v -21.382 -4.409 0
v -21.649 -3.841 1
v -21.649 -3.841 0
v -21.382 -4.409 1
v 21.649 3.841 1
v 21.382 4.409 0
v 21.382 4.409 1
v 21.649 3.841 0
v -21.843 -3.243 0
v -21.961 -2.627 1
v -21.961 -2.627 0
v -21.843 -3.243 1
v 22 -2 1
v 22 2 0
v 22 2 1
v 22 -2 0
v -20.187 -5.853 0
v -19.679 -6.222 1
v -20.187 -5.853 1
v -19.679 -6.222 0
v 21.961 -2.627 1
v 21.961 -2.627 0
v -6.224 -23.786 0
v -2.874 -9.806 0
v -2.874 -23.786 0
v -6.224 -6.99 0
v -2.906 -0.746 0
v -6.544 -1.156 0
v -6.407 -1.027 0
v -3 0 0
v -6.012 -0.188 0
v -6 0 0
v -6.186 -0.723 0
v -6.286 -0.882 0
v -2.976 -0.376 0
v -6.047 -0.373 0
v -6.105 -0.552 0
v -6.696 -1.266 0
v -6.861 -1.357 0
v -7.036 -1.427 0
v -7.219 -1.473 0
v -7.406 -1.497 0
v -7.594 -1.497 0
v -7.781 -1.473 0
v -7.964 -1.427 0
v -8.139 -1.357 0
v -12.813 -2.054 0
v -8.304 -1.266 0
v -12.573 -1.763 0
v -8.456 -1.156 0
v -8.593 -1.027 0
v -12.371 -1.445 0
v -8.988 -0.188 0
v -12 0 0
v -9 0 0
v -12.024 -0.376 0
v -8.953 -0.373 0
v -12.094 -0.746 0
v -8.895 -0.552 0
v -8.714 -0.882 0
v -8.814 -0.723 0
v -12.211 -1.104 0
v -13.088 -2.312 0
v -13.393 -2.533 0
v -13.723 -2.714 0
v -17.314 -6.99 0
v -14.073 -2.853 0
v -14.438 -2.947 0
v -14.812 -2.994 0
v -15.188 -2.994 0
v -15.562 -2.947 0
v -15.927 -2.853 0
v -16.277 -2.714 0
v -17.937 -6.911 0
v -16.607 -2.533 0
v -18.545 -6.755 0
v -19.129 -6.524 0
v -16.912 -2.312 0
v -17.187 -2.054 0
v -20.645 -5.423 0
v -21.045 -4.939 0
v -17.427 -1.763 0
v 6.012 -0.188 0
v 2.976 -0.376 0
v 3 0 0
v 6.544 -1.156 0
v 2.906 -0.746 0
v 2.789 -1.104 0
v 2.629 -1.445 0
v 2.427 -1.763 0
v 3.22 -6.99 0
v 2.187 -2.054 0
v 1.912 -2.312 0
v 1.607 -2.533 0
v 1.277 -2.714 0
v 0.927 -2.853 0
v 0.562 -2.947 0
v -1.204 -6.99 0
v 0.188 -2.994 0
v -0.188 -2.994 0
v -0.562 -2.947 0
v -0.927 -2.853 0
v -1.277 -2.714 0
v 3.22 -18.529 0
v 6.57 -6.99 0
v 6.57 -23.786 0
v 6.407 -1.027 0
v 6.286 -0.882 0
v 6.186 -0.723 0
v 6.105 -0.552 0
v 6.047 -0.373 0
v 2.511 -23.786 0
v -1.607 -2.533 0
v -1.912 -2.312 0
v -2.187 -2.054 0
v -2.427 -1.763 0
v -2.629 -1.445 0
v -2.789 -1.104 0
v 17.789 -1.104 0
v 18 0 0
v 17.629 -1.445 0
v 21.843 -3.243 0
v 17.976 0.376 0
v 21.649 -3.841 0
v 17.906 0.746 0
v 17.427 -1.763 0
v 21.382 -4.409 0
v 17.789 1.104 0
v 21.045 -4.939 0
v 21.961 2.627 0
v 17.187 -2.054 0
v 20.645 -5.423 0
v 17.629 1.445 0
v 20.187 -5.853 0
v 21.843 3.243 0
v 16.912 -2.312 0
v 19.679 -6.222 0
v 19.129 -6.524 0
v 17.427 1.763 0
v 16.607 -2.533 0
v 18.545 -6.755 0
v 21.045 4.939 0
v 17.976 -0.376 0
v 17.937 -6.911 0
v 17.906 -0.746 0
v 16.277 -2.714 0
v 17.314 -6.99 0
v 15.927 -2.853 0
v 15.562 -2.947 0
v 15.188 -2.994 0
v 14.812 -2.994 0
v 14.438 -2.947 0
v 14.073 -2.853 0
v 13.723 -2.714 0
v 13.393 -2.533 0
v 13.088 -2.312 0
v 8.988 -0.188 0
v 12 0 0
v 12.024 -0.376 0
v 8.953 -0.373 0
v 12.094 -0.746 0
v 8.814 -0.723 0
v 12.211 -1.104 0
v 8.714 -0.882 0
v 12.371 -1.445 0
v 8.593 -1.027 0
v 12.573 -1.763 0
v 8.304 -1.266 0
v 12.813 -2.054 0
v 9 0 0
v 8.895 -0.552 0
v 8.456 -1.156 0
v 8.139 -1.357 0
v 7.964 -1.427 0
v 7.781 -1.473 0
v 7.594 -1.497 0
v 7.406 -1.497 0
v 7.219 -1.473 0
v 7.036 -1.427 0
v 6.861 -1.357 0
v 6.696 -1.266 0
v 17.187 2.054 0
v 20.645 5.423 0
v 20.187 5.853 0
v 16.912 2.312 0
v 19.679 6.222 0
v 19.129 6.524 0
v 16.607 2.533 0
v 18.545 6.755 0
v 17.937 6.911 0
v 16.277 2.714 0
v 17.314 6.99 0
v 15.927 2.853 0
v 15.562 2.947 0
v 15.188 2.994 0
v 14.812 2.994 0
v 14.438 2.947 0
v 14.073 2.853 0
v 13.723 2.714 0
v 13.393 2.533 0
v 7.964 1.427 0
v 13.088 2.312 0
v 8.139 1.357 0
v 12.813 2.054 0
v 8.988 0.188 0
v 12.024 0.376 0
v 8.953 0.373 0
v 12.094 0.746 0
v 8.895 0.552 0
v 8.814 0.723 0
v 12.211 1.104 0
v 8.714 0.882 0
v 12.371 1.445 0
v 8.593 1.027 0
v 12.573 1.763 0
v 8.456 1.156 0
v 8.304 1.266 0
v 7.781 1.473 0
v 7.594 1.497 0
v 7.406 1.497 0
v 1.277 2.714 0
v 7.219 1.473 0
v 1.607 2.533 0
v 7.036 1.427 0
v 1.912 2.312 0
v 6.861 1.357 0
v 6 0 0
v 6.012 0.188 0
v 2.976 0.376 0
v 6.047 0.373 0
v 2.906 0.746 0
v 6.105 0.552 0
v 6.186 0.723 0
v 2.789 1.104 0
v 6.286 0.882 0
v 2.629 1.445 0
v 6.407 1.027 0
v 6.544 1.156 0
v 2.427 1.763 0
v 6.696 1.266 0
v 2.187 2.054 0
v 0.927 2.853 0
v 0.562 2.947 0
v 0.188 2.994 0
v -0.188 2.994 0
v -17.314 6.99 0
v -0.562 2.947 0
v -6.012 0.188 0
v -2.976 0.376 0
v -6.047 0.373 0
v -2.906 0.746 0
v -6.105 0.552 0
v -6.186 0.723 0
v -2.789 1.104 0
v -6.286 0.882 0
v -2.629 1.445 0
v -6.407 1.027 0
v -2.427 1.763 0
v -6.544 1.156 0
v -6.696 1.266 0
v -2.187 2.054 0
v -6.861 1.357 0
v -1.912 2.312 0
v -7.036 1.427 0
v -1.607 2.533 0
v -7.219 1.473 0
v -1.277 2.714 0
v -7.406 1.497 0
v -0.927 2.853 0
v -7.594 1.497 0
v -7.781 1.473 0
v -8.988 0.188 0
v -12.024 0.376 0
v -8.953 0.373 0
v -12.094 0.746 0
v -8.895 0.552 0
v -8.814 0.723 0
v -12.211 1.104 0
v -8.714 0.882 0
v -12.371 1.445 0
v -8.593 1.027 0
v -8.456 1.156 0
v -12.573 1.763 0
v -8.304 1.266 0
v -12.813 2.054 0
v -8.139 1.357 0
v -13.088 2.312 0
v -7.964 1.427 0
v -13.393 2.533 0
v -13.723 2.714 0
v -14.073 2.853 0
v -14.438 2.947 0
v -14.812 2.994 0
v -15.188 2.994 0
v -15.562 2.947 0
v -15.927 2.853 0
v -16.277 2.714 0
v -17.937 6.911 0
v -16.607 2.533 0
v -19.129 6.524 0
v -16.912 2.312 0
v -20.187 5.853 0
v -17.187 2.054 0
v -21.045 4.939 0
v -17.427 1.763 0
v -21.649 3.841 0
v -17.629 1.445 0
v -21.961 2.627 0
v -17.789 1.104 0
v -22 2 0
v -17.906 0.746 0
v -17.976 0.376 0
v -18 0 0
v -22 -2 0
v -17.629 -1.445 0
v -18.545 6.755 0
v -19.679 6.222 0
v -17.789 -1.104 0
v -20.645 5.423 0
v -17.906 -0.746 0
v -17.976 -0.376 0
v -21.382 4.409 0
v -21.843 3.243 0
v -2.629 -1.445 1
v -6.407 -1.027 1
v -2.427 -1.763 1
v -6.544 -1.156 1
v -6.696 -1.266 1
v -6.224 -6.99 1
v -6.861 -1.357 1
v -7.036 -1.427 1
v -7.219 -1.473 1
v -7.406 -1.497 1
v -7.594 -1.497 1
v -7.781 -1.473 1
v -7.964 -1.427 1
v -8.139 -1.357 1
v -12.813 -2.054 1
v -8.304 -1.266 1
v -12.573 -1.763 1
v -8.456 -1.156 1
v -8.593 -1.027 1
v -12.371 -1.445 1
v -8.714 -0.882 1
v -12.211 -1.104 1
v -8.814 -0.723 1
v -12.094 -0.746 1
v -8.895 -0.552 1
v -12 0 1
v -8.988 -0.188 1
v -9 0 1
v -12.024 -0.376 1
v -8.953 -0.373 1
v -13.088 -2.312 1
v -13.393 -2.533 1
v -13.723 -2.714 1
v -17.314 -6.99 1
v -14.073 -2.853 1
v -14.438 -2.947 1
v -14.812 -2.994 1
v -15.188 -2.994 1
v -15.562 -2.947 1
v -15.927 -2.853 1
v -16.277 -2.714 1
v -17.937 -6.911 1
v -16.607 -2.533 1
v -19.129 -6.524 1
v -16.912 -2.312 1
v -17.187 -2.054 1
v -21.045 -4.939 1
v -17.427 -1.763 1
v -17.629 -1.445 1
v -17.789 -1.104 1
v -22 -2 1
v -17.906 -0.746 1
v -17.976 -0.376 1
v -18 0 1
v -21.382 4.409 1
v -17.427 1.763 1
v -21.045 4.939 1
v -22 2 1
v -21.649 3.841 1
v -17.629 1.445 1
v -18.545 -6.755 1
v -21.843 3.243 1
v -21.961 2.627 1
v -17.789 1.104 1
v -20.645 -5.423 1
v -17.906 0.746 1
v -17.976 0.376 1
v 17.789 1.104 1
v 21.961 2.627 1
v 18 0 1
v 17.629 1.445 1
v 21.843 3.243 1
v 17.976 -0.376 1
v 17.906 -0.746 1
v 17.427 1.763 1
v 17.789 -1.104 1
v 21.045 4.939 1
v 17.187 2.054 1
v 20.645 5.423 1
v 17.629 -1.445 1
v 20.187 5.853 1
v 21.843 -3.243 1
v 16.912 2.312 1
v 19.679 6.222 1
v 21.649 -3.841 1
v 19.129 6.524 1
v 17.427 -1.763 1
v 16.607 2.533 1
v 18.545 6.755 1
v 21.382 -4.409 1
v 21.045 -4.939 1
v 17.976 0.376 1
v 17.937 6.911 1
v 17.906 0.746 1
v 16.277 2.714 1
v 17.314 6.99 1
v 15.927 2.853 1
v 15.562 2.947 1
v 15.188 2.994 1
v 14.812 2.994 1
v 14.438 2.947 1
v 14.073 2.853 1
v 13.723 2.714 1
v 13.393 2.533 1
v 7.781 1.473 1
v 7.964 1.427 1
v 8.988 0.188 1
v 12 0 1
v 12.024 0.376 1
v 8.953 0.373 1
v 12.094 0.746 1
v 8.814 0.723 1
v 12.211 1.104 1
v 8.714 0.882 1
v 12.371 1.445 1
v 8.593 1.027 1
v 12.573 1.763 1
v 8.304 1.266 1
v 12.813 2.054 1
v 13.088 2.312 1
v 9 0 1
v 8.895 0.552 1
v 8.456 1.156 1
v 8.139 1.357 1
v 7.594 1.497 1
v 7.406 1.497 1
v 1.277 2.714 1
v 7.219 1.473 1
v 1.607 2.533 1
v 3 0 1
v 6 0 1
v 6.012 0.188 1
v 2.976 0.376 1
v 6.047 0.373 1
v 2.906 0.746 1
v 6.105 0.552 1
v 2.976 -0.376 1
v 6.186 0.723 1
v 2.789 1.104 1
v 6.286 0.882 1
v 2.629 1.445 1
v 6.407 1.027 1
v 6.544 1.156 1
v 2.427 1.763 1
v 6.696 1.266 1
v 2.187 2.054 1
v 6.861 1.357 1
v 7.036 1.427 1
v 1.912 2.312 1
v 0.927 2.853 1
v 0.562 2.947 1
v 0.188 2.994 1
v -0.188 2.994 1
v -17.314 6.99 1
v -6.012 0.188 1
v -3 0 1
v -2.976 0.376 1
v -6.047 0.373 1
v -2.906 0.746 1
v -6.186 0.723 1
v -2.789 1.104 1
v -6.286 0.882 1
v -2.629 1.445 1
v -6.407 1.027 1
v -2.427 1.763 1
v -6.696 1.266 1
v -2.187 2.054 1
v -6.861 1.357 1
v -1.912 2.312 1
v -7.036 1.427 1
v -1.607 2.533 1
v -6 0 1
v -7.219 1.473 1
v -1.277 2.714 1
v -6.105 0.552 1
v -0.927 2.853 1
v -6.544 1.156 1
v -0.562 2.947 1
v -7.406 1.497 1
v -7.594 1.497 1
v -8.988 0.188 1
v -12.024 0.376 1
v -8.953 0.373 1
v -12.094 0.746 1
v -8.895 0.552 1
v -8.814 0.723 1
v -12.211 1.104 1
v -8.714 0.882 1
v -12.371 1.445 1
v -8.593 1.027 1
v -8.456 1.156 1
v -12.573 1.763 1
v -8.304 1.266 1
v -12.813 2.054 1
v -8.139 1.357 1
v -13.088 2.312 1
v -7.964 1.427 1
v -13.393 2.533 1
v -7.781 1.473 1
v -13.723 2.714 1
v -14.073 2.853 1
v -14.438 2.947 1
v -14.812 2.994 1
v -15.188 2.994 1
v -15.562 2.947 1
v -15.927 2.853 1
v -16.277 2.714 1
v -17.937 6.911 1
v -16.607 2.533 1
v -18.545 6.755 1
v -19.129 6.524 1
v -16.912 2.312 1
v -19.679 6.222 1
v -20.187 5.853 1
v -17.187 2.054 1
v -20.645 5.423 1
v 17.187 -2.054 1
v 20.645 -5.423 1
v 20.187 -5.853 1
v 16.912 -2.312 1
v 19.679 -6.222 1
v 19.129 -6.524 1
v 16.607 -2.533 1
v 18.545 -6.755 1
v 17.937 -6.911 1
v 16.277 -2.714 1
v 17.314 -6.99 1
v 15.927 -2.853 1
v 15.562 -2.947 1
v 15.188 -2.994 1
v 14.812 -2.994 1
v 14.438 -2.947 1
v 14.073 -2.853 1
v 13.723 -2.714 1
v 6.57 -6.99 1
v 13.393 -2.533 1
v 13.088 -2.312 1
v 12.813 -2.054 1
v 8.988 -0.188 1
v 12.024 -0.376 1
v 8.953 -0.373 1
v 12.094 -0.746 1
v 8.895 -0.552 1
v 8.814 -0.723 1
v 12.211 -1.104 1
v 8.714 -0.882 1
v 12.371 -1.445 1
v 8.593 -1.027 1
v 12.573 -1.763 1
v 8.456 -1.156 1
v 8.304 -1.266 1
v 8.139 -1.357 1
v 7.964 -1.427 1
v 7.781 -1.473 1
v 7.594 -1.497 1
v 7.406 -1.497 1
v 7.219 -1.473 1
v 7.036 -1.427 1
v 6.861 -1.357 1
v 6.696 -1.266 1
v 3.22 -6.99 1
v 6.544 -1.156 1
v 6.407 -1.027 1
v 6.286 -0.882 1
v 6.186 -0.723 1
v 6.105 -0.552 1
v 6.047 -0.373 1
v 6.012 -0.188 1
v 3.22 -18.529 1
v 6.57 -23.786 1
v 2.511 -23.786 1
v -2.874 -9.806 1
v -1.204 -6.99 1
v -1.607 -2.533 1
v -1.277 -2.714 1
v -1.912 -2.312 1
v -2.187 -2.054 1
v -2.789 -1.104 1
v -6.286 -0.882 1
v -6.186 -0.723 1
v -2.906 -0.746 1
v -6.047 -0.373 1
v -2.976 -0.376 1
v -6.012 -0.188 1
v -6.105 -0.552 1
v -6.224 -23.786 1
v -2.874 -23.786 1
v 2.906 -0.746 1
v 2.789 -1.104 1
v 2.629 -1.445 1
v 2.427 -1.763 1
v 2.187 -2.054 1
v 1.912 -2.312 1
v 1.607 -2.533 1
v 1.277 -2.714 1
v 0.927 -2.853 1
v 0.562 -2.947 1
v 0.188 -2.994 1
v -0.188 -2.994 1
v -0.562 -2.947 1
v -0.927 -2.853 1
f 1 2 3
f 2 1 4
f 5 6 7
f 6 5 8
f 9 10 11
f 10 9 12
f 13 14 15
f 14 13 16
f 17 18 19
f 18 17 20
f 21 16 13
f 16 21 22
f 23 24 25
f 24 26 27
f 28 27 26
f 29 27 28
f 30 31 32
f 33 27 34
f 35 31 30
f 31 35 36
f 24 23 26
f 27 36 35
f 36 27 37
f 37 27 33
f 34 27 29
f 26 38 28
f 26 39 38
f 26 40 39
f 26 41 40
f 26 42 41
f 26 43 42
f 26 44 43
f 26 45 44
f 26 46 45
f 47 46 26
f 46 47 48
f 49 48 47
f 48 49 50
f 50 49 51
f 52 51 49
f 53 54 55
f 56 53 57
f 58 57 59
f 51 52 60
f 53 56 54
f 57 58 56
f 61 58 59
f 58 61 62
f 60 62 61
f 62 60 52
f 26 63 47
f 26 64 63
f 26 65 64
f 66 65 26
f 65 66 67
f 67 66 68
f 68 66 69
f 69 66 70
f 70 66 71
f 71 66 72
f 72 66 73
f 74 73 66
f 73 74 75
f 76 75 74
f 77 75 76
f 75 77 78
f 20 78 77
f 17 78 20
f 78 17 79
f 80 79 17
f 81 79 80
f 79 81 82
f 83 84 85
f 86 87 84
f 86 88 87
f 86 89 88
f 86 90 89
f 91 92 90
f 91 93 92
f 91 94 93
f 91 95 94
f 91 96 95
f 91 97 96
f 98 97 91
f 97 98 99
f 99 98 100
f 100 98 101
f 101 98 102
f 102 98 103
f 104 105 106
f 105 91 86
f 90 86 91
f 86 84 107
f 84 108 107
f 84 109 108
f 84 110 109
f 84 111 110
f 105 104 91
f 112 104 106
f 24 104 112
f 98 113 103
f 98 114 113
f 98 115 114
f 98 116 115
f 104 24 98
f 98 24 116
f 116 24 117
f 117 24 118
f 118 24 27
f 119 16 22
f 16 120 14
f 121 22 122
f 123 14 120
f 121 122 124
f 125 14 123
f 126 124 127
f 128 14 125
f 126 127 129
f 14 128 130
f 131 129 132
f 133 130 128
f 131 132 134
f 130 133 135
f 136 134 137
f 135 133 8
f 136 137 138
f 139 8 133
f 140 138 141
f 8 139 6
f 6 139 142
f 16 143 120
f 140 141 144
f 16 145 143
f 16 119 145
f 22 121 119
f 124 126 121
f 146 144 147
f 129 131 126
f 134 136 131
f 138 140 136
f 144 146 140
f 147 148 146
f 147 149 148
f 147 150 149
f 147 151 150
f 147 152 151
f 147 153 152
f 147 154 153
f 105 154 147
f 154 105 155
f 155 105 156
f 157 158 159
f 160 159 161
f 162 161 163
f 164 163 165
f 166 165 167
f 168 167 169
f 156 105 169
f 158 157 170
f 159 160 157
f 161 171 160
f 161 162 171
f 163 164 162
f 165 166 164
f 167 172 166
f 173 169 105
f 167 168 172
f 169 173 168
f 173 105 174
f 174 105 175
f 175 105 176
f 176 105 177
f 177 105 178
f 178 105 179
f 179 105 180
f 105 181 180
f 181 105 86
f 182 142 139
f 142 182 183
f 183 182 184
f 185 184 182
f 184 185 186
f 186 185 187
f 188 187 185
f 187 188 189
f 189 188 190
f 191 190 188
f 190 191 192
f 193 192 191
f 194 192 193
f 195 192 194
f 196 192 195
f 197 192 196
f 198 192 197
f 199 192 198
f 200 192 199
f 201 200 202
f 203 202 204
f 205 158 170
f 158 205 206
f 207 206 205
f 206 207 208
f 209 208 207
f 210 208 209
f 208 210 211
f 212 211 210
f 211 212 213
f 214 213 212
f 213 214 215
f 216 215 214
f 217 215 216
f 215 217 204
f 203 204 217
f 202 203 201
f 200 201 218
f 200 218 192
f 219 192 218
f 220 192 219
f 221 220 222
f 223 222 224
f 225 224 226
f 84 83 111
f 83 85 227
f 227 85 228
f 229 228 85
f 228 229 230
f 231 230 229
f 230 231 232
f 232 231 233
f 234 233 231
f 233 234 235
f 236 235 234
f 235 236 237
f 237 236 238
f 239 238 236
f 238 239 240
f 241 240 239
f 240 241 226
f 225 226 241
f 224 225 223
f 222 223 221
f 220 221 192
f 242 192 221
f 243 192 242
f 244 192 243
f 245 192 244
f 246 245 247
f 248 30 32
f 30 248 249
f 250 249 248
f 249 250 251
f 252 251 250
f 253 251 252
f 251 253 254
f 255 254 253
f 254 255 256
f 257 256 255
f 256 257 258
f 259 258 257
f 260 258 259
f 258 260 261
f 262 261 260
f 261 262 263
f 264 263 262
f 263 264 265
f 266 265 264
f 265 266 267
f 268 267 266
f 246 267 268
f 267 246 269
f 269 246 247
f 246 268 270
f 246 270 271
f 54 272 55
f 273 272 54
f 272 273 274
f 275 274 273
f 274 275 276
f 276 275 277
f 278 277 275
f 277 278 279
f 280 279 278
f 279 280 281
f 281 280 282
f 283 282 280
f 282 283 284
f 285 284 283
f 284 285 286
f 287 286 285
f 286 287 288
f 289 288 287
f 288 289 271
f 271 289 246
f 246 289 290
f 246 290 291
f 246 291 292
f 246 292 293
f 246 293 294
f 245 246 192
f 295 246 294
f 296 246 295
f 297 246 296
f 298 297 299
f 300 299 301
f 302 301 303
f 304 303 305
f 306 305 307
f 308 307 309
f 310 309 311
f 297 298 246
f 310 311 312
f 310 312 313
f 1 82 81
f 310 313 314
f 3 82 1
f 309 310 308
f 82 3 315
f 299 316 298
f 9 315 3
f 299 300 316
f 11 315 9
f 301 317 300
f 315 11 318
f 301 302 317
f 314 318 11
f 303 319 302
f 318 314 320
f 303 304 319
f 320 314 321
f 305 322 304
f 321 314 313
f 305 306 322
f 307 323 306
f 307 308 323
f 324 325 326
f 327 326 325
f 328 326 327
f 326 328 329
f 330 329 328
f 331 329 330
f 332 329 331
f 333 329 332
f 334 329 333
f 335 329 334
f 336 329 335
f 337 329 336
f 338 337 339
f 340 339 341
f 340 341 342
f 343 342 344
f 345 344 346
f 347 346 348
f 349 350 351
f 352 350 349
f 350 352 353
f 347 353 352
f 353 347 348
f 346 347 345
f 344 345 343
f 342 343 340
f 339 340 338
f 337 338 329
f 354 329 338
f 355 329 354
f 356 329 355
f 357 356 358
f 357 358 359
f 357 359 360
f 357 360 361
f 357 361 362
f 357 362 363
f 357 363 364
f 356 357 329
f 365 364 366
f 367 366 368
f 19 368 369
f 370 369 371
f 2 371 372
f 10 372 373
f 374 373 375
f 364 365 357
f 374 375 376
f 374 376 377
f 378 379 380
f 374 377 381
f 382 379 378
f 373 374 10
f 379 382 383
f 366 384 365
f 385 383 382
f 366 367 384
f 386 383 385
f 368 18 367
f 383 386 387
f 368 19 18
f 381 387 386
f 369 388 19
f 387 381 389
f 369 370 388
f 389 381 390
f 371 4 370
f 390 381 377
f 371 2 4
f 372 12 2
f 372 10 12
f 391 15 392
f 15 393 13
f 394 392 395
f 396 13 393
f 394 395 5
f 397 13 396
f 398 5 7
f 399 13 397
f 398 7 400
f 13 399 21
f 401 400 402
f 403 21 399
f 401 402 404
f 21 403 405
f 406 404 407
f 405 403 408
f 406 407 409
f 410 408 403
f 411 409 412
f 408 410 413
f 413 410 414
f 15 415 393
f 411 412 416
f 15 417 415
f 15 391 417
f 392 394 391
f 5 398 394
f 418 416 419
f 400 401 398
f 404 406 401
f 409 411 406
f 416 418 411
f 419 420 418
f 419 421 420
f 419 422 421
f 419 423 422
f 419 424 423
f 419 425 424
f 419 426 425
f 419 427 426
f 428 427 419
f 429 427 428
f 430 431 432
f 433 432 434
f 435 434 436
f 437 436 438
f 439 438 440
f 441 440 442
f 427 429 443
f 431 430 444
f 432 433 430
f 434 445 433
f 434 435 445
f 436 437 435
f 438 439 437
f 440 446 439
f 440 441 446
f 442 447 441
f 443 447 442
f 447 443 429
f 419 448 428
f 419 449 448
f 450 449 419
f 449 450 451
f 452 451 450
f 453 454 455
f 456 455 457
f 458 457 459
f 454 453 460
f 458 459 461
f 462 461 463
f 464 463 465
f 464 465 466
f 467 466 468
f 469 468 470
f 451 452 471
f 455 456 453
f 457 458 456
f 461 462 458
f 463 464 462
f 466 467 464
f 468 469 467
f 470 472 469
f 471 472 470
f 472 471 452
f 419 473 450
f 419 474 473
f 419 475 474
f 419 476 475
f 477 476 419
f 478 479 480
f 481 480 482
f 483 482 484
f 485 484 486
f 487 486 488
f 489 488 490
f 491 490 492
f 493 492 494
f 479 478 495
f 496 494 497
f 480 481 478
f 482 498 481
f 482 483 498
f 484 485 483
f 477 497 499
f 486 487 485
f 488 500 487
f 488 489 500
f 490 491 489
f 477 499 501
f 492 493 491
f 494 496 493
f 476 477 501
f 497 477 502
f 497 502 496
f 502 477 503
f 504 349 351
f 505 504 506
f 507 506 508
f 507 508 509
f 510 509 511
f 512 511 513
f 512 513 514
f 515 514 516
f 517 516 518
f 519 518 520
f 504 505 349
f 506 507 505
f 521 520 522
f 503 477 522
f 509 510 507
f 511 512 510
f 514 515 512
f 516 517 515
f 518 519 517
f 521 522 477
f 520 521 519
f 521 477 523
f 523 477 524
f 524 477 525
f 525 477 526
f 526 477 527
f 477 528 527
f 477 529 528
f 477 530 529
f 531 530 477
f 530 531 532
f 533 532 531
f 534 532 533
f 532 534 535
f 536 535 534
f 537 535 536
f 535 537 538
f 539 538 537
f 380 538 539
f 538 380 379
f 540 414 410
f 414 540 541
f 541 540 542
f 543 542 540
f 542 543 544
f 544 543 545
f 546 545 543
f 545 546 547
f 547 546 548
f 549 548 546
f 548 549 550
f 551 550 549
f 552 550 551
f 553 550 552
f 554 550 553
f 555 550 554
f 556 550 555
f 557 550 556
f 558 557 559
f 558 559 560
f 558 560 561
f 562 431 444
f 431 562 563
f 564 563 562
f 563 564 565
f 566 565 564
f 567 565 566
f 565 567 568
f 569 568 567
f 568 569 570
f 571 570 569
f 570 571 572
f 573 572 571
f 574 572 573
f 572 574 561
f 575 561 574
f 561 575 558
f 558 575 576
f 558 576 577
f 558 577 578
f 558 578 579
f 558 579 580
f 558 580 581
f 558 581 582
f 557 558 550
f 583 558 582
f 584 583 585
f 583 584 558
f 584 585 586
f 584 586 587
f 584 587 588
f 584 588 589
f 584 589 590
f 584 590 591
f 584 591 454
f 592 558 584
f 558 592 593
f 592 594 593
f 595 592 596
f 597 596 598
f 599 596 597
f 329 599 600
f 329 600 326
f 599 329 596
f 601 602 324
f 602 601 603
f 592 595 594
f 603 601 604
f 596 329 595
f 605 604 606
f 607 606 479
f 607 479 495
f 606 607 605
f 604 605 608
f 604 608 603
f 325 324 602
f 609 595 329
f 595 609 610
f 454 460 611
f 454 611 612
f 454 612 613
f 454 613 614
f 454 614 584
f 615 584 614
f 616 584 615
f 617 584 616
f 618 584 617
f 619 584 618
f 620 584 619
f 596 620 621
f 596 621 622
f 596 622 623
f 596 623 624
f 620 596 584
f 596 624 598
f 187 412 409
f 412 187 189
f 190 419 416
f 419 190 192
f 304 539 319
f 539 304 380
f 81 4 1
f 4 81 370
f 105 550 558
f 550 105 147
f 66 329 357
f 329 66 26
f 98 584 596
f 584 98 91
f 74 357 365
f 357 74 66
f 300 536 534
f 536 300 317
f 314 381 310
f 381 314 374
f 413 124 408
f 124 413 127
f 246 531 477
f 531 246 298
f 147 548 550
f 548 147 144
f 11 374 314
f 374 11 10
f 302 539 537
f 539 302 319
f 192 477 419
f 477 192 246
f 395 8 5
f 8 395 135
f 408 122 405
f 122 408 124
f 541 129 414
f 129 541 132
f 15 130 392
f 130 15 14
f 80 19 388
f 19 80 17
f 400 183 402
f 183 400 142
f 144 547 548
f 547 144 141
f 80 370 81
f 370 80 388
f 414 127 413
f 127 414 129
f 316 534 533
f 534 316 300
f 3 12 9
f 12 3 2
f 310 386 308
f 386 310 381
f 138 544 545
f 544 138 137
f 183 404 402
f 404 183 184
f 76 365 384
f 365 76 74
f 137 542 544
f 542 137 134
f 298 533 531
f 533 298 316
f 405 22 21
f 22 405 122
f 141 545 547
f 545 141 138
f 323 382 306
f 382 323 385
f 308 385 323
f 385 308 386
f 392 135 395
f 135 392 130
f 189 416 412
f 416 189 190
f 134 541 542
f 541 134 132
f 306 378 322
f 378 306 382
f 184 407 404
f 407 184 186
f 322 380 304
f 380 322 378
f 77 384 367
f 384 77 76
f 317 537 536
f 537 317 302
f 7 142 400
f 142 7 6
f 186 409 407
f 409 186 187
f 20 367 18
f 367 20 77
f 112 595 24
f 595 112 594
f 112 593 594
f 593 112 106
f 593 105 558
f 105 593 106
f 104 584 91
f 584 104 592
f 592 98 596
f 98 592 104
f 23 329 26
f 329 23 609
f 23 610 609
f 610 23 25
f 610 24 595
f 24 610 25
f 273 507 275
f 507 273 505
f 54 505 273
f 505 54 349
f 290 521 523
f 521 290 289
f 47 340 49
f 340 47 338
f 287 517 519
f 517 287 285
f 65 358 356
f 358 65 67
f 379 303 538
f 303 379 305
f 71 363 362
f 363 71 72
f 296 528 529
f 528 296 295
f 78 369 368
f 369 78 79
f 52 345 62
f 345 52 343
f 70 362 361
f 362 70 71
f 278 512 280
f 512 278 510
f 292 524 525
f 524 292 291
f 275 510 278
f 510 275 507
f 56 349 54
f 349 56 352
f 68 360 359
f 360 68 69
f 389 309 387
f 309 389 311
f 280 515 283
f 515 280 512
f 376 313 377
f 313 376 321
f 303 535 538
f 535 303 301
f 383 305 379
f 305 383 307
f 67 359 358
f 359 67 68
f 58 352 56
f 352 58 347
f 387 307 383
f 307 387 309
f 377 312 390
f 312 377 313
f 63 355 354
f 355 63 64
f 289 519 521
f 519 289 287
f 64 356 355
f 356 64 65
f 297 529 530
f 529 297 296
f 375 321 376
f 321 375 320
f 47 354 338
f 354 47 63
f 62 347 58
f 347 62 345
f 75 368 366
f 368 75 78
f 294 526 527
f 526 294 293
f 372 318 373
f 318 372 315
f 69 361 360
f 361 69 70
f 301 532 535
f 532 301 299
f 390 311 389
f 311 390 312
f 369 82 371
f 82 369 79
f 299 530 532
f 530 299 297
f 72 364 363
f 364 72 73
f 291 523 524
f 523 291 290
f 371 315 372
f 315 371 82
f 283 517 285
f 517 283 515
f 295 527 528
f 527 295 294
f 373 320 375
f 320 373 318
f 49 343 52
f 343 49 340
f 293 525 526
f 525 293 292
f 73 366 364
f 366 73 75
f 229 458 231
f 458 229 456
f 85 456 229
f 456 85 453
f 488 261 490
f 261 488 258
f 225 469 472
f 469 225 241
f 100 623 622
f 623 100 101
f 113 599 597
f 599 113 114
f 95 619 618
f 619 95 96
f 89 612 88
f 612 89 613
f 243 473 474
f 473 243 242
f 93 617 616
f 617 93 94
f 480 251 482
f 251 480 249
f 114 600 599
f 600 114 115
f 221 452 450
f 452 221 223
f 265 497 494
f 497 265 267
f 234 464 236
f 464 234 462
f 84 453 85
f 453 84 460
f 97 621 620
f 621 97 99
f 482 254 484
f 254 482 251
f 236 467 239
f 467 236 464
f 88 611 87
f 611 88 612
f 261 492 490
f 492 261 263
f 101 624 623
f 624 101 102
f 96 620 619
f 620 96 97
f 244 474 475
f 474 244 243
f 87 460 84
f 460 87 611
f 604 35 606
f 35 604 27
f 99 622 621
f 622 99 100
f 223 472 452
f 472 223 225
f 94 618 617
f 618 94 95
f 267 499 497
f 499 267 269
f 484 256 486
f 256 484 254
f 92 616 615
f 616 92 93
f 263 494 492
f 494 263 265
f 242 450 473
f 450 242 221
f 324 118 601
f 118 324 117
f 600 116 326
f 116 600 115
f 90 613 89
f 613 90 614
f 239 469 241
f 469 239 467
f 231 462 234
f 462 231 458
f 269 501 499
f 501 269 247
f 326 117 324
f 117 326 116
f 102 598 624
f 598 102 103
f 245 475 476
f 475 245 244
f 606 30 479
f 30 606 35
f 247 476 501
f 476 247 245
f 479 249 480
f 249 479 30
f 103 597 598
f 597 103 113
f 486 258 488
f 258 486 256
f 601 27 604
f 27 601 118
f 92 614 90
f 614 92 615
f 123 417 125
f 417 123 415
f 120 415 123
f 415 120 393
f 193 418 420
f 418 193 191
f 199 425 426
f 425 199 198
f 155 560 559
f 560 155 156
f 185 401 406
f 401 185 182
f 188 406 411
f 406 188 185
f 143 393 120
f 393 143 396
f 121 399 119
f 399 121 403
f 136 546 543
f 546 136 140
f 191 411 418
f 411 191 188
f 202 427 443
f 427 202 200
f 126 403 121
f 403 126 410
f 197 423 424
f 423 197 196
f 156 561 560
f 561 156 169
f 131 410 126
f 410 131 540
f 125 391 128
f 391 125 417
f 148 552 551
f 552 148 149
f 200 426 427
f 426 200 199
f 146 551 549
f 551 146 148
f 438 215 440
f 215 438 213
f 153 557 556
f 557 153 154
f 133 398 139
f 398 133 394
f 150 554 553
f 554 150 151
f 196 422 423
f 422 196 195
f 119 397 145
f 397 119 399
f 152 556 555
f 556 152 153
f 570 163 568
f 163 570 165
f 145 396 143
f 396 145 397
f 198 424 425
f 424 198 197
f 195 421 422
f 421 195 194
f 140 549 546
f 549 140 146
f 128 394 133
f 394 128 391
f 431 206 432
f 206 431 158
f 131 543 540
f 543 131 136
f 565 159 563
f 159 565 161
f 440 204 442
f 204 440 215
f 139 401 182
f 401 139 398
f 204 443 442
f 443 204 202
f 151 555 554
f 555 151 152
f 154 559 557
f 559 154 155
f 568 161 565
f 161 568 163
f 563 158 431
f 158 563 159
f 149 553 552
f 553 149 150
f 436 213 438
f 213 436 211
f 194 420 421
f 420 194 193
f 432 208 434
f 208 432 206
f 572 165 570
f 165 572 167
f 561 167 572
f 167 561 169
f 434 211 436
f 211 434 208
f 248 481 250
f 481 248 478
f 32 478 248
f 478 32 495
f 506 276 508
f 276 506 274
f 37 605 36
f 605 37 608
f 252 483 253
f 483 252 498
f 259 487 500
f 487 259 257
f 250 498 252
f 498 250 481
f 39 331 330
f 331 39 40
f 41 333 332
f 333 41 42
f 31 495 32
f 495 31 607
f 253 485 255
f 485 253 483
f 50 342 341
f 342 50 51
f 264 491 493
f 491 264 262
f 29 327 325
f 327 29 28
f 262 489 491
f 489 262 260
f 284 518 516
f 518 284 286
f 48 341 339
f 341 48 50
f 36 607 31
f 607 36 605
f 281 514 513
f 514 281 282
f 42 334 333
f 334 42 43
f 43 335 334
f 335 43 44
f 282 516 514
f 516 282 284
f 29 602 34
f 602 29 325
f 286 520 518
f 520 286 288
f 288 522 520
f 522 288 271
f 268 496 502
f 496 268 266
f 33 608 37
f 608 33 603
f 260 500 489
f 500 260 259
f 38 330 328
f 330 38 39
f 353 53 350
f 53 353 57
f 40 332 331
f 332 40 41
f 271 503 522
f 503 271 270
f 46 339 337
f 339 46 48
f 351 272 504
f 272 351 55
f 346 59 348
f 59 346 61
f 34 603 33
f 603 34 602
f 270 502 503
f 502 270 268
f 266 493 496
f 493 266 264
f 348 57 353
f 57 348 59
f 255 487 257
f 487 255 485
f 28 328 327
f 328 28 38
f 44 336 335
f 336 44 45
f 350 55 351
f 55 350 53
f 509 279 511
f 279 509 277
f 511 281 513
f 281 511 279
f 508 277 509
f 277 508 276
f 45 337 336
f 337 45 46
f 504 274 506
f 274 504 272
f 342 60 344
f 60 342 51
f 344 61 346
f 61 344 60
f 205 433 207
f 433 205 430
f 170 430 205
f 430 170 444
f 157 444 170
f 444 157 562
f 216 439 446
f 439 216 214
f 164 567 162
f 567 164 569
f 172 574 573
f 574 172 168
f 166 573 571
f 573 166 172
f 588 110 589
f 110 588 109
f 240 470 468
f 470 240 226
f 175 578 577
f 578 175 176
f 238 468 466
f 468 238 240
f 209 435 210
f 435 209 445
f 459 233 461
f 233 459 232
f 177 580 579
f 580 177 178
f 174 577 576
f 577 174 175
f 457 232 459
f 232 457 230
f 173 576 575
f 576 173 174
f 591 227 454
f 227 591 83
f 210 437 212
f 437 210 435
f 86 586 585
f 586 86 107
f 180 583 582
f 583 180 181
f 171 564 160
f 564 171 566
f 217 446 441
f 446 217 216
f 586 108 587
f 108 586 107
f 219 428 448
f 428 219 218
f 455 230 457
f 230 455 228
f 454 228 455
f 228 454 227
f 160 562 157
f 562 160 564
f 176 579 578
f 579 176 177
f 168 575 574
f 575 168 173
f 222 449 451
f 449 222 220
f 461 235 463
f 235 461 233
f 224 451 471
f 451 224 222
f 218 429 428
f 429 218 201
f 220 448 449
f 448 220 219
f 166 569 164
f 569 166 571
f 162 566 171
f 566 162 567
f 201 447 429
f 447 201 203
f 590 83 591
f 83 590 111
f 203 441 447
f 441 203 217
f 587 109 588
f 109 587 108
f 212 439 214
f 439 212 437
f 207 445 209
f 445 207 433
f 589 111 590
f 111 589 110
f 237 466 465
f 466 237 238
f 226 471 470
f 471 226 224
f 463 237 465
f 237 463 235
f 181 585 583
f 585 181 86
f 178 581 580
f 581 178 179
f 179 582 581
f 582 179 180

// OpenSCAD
$fn = 50;


difference() {
	union() {
		*color(alpha = 1.0000000000, c = "gray") {
			translate(v = [0, 14, 0]) {
				linear_extrude(height = 1) {
					text(font = "Arial:style=Bold", halign = "center", size = 4.5000000000, text = "COMMENT description oobb_plate_shape_p_type_1_depth_3_width_1_thickness_n_extra_oobb_size", valign = "center");
				}
			}
		}
		hull() {
			translate(v = [-17.0000000000, 2.0000000000, 0]) {
				cylinder(h = 1, r = 5);
			}
			translate(v = [17.0000000000, 2.0000000000, 0]) {
				cylinder(h = 1, r = 5);
			}
			translate(v = [-17.0000000000, -2.0000000000, 0]) {
				cylinder(h = 1, r = 5);
			}
			translate(v = [17.0000000000, -2.0000000000, 0]) {
				cylinder(h = 1, r = 5);
			}
		}
		translate(v = [0, -5, 0]) {
			linear_extrude(height = 1) {
				text(font = "DejaVu Sans Mono:style=Bold", halign = "center", size = 19.0000000000, text = "N", valign = "top");
			}
		}
	}
	union() {
		*color(alpha = 1.0000000000, c = "gray") {
			translate(v = [0, 14, 0]) {
				linear_extrude(height = 1) {
					text(font = "Arial:style=Bold", halign = "center", size = 4.5000000000, text = "COMMENT description oobb_holes_shape_n_type_3_width_1_thickness_n_extra_oobb_size_1_height_'all'_holes_true_both_holes", valign = "center");
				}
			}
		}
		translate(v = [-15.0000000000, 0.0000000000, 0]) {
			translate(v = [0, 0, -50]) {
				cylinder(h = 100, r = 3.0000000000);
			}
		}
		translate(v = [0, 0, -50]) {
			cylinder(h = 100, r = 3.0000000000);
		}
		translate(v = [15.0000000000, 0.0000000000, 0]) {
			translate(v = [0, 0, -50]) {
				cylinder(h = 100, r = 3.0000000000);
			}
		}
		translate(v = [-15.0000000000, 0.0000000000, 0]) {
			translate(v = [0, 0, -50]) {
				cylinder(h = 100, r = 1.5000000000);
			}
		}
		translate(v = [-7.5000000000, 0.0000000000, 0]) {
			translate(v = [0, 0, -50]) {
				cylinder(h = 100, r = 1.5000000000);
			}
		}
		translate(v = [0, 0, -50]) {
			cylinder(h = 100, r = 1.5000000000);
		}
		translate(v = [7.5000000000, 0.0000000000, 0]) {
			translate(v = [0, 0, -50]) {
				cylinder(h = 100, r = 1.5000000000);
			}
		}
		translate(v = [15.0000000000, 0.0000000000, 0]) {
			translate(v = [0, 0, -50]) {
				cylinder(h = 100, r = 1.5000000000);
			}
		}
	}
}
